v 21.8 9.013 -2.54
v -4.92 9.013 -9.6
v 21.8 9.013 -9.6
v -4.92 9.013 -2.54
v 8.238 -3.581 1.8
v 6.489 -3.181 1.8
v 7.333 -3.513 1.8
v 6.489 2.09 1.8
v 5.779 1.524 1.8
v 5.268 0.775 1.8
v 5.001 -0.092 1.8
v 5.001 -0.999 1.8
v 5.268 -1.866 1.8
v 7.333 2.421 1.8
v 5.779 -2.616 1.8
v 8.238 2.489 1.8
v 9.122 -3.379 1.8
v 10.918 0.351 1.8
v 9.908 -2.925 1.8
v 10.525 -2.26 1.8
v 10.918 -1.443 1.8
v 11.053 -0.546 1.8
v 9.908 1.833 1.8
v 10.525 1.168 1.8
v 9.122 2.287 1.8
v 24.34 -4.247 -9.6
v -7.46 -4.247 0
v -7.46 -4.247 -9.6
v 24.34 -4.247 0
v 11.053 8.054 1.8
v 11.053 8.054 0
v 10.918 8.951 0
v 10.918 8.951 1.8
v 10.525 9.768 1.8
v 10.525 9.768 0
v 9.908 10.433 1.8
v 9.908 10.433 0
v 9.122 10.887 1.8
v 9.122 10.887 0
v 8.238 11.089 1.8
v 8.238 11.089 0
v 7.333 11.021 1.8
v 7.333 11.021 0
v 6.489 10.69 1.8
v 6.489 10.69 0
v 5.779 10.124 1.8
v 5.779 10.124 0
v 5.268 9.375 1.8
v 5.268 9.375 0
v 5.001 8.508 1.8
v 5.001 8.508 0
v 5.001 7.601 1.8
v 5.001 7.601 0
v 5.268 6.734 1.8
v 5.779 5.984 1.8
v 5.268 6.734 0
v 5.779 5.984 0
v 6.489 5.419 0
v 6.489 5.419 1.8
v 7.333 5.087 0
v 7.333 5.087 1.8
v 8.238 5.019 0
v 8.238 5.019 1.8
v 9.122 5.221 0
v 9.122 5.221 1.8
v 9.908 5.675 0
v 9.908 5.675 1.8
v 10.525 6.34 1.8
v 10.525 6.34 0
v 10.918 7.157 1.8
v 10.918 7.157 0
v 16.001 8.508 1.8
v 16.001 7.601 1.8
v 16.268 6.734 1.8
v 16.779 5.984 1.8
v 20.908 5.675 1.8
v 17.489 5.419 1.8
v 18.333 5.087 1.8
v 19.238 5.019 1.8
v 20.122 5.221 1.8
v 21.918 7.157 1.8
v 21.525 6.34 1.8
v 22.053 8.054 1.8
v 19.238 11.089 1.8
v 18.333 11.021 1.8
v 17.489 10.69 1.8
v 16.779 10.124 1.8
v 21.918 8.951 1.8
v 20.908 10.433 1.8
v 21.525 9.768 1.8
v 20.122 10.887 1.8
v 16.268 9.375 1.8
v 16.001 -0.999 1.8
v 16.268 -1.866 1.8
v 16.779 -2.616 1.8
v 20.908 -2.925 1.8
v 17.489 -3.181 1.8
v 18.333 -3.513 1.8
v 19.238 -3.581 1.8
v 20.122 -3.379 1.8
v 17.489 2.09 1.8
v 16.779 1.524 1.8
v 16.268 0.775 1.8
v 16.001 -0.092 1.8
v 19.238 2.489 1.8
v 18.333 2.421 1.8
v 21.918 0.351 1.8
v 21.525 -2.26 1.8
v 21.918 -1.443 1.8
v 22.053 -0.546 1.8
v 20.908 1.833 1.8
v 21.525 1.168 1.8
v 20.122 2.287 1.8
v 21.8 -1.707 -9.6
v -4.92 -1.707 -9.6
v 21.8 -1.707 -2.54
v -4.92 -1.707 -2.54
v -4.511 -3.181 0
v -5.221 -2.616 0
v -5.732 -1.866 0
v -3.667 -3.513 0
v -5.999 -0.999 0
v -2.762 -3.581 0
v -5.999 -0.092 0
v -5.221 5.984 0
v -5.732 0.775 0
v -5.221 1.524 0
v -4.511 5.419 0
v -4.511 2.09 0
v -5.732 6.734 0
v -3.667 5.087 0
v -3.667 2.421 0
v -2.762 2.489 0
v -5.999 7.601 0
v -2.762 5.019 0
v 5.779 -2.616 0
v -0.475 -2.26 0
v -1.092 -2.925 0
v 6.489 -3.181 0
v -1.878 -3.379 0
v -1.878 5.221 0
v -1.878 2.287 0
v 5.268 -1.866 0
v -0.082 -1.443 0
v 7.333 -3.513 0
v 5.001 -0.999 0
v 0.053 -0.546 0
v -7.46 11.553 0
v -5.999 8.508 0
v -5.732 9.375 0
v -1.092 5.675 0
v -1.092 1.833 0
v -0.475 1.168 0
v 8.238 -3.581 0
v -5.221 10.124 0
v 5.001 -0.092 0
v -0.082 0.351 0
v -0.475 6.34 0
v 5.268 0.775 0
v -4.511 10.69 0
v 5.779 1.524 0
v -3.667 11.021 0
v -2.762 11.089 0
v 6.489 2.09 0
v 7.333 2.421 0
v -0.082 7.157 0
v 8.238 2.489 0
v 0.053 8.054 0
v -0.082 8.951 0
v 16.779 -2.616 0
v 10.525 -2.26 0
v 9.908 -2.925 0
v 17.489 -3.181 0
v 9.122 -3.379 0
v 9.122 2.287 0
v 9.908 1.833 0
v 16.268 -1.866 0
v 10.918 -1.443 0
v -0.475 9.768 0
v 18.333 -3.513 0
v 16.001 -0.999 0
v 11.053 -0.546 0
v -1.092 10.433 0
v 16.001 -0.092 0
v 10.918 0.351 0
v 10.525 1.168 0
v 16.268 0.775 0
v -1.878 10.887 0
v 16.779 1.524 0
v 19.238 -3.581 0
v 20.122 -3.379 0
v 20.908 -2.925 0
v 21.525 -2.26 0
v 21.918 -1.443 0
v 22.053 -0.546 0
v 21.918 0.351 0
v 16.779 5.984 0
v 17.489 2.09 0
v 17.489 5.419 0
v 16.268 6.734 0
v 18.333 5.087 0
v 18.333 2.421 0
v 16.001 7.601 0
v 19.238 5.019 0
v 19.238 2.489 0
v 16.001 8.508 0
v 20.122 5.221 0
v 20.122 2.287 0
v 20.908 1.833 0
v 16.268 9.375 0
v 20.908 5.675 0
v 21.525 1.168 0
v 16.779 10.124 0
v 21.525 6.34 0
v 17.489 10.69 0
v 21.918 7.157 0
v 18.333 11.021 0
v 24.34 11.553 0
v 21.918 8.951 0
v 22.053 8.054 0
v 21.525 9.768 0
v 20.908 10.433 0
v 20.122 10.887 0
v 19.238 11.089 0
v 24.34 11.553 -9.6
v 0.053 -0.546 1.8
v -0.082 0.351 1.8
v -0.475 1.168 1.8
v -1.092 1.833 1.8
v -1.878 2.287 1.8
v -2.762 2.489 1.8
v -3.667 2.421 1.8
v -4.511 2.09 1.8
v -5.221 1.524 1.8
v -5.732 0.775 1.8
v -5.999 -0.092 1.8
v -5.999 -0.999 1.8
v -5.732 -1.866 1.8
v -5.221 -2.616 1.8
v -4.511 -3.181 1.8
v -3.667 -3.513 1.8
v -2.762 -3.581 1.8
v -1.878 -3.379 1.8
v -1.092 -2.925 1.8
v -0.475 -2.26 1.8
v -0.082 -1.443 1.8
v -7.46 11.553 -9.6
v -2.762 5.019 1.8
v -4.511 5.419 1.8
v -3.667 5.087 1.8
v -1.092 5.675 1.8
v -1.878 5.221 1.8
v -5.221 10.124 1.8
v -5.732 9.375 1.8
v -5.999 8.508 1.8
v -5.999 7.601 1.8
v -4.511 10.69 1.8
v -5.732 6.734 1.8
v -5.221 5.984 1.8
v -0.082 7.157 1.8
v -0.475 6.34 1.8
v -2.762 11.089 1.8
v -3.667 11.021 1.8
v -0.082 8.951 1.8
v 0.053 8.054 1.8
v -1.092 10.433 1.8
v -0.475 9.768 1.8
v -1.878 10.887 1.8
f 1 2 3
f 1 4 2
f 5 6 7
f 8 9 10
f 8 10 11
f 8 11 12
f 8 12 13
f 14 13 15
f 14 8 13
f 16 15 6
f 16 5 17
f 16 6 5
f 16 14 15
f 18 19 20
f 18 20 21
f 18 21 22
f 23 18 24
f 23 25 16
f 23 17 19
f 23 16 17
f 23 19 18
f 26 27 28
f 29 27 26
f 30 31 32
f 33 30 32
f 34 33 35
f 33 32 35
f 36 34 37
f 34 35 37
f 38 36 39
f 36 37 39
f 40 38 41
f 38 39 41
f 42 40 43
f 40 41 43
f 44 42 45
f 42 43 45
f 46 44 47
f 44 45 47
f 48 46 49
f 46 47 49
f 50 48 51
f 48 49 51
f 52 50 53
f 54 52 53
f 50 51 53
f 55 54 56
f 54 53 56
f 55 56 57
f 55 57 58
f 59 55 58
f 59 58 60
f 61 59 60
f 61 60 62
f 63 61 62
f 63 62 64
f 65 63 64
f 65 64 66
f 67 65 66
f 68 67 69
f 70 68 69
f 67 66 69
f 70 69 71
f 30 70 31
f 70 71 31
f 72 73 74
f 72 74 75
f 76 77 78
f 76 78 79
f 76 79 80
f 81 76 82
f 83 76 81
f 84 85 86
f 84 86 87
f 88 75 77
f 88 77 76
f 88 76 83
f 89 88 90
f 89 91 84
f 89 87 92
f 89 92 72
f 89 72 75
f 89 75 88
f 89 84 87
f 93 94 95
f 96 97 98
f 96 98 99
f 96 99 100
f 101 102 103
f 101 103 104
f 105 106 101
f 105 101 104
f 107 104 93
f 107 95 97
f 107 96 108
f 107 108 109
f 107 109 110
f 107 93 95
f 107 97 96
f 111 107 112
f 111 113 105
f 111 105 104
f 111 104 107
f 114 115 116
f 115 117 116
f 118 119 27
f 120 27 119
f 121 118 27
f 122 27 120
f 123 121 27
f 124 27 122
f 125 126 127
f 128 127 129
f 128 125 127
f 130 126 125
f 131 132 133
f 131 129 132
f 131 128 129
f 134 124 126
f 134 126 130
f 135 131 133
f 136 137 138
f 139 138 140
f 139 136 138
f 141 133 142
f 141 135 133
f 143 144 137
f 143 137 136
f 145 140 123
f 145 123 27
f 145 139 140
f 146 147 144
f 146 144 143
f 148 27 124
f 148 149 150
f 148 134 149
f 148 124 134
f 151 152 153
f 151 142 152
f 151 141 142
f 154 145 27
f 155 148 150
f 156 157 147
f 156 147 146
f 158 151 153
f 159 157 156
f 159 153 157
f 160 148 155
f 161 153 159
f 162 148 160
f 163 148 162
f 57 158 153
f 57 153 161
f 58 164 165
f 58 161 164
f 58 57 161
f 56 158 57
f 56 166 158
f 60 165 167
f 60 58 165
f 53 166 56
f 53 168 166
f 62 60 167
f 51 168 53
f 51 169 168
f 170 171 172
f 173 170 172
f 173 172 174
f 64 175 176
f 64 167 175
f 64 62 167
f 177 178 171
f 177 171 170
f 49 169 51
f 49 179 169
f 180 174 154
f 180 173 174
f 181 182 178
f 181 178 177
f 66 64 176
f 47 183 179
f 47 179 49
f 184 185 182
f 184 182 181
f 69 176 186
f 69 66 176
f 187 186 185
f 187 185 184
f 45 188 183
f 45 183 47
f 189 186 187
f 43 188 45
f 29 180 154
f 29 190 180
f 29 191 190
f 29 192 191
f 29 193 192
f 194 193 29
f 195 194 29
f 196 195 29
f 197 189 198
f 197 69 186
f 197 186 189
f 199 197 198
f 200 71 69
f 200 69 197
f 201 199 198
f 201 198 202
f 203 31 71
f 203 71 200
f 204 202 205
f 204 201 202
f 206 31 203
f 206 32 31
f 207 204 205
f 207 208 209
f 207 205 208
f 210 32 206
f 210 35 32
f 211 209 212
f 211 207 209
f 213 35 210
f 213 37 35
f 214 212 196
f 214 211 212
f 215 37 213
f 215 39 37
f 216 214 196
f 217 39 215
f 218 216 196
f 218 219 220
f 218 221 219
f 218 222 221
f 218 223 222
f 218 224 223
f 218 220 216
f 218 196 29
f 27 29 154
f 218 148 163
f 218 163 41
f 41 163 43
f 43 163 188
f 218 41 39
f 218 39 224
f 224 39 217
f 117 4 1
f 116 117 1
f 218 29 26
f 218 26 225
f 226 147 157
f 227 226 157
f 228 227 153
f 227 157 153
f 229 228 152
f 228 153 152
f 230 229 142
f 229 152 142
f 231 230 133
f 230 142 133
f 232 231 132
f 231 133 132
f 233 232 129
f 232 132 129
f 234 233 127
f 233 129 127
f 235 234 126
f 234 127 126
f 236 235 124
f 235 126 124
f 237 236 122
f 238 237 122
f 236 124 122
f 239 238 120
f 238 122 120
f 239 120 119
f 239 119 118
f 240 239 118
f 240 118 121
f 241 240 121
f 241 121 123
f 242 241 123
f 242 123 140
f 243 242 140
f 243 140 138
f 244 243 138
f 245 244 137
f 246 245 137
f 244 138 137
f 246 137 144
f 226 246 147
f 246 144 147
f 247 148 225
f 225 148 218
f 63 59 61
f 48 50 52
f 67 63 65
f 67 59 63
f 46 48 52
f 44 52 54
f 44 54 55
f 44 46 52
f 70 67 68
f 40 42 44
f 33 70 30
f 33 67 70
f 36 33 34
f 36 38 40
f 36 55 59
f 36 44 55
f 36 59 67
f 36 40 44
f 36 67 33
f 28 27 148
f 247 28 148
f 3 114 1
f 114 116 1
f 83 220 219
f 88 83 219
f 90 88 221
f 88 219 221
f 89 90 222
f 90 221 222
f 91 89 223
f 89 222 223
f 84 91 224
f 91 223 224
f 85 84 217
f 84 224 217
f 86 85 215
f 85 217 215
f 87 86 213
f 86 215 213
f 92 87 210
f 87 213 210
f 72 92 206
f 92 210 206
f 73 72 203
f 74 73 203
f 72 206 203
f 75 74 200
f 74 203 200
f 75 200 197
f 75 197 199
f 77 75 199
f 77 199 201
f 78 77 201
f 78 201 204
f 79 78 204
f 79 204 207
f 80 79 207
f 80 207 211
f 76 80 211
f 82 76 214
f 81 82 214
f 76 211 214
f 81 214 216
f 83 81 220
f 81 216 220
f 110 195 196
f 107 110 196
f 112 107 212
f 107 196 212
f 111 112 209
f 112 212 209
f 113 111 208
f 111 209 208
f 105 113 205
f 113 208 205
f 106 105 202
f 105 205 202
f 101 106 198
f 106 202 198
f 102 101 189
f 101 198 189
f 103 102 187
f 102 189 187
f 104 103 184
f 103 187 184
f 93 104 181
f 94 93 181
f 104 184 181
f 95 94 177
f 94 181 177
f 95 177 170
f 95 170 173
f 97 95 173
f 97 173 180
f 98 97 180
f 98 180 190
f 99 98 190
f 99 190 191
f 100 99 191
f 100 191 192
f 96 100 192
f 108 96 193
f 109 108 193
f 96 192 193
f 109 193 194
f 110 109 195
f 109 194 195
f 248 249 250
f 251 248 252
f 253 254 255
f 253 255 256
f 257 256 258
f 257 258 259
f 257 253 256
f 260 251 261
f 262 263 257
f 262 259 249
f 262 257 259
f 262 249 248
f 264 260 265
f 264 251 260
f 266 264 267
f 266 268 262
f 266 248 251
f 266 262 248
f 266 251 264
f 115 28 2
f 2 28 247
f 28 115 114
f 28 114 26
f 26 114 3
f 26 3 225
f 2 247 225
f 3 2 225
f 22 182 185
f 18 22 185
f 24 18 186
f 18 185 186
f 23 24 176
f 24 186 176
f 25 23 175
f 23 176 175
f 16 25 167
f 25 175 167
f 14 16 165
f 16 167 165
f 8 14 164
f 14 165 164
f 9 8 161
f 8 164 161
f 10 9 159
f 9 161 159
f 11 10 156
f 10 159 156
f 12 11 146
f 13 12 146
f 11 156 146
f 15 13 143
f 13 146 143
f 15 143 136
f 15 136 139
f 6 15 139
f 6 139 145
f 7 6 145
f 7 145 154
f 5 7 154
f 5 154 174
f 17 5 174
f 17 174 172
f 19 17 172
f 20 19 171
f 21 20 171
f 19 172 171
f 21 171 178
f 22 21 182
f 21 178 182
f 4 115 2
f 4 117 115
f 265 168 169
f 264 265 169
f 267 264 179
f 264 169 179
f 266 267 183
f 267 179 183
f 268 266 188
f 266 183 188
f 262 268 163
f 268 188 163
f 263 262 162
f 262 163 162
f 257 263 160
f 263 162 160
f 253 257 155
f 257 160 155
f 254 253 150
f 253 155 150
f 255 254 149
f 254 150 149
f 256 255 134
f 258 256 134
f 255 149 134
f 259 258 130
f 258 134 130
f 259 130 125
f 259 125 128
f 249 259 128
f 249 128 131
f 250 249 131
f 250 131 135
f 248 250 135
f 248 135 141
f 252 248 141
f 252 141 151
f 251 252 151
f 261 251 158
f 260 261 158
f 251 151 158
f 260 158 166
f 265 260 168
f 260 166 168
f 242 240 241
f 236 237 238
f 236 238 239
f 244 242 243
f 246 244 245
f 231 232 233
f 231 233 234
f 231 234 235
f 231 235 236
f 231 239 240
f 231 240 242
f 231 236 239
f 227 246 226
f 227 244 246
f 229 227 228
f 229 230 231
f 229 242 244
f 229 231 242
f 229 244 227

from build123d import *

# Parameters (mm, degrees)
F0_W     = 31.8
F0_H     = 15.8
F1_DEPTH = 9.6
F2_T     = -2.54
F3_R     = 3.043204
F4_DEPTH = 1.8


with BuildPart() as f1:
    # F0 (on Top) → F1 (new body)
    with BuildSketch(Plane.XY):
        with Locations((8.439594, 3.65301)):
            Rectangle(F0_W, F0_H)
    extrude(amount=-F1_DEPTH)

    # F2
    f2_openings = [f1.faces().sort_by_distance(p)[0] for p in [
        (8.439594, 3.65301, -9.6),
    ]]
    offset(amount=F2_T, openings=f2_openings)

    # F3 (on face) → F4 (join)
    with BuildSketch(Plane.XY):
        with Locations((19.01015, 8.054115)):
            Circle(F3_R)
        with Locations((19.01015, -0.545885)):
            Circle(F3_R)
        with Locations((8.01015, 8.054115)):
            Circle(F3_R)
        with Locations((8.01015, -0.545885)):
            Circle(F3_R)
        with Locations((-2.98985, 8.054115)):
            Circle(F3_R)
        with Locations((-2.98985, -0.545885)):
            Circle(F3_R)
    extrude(amount=F4_DEPTH)


solid = f1.part
